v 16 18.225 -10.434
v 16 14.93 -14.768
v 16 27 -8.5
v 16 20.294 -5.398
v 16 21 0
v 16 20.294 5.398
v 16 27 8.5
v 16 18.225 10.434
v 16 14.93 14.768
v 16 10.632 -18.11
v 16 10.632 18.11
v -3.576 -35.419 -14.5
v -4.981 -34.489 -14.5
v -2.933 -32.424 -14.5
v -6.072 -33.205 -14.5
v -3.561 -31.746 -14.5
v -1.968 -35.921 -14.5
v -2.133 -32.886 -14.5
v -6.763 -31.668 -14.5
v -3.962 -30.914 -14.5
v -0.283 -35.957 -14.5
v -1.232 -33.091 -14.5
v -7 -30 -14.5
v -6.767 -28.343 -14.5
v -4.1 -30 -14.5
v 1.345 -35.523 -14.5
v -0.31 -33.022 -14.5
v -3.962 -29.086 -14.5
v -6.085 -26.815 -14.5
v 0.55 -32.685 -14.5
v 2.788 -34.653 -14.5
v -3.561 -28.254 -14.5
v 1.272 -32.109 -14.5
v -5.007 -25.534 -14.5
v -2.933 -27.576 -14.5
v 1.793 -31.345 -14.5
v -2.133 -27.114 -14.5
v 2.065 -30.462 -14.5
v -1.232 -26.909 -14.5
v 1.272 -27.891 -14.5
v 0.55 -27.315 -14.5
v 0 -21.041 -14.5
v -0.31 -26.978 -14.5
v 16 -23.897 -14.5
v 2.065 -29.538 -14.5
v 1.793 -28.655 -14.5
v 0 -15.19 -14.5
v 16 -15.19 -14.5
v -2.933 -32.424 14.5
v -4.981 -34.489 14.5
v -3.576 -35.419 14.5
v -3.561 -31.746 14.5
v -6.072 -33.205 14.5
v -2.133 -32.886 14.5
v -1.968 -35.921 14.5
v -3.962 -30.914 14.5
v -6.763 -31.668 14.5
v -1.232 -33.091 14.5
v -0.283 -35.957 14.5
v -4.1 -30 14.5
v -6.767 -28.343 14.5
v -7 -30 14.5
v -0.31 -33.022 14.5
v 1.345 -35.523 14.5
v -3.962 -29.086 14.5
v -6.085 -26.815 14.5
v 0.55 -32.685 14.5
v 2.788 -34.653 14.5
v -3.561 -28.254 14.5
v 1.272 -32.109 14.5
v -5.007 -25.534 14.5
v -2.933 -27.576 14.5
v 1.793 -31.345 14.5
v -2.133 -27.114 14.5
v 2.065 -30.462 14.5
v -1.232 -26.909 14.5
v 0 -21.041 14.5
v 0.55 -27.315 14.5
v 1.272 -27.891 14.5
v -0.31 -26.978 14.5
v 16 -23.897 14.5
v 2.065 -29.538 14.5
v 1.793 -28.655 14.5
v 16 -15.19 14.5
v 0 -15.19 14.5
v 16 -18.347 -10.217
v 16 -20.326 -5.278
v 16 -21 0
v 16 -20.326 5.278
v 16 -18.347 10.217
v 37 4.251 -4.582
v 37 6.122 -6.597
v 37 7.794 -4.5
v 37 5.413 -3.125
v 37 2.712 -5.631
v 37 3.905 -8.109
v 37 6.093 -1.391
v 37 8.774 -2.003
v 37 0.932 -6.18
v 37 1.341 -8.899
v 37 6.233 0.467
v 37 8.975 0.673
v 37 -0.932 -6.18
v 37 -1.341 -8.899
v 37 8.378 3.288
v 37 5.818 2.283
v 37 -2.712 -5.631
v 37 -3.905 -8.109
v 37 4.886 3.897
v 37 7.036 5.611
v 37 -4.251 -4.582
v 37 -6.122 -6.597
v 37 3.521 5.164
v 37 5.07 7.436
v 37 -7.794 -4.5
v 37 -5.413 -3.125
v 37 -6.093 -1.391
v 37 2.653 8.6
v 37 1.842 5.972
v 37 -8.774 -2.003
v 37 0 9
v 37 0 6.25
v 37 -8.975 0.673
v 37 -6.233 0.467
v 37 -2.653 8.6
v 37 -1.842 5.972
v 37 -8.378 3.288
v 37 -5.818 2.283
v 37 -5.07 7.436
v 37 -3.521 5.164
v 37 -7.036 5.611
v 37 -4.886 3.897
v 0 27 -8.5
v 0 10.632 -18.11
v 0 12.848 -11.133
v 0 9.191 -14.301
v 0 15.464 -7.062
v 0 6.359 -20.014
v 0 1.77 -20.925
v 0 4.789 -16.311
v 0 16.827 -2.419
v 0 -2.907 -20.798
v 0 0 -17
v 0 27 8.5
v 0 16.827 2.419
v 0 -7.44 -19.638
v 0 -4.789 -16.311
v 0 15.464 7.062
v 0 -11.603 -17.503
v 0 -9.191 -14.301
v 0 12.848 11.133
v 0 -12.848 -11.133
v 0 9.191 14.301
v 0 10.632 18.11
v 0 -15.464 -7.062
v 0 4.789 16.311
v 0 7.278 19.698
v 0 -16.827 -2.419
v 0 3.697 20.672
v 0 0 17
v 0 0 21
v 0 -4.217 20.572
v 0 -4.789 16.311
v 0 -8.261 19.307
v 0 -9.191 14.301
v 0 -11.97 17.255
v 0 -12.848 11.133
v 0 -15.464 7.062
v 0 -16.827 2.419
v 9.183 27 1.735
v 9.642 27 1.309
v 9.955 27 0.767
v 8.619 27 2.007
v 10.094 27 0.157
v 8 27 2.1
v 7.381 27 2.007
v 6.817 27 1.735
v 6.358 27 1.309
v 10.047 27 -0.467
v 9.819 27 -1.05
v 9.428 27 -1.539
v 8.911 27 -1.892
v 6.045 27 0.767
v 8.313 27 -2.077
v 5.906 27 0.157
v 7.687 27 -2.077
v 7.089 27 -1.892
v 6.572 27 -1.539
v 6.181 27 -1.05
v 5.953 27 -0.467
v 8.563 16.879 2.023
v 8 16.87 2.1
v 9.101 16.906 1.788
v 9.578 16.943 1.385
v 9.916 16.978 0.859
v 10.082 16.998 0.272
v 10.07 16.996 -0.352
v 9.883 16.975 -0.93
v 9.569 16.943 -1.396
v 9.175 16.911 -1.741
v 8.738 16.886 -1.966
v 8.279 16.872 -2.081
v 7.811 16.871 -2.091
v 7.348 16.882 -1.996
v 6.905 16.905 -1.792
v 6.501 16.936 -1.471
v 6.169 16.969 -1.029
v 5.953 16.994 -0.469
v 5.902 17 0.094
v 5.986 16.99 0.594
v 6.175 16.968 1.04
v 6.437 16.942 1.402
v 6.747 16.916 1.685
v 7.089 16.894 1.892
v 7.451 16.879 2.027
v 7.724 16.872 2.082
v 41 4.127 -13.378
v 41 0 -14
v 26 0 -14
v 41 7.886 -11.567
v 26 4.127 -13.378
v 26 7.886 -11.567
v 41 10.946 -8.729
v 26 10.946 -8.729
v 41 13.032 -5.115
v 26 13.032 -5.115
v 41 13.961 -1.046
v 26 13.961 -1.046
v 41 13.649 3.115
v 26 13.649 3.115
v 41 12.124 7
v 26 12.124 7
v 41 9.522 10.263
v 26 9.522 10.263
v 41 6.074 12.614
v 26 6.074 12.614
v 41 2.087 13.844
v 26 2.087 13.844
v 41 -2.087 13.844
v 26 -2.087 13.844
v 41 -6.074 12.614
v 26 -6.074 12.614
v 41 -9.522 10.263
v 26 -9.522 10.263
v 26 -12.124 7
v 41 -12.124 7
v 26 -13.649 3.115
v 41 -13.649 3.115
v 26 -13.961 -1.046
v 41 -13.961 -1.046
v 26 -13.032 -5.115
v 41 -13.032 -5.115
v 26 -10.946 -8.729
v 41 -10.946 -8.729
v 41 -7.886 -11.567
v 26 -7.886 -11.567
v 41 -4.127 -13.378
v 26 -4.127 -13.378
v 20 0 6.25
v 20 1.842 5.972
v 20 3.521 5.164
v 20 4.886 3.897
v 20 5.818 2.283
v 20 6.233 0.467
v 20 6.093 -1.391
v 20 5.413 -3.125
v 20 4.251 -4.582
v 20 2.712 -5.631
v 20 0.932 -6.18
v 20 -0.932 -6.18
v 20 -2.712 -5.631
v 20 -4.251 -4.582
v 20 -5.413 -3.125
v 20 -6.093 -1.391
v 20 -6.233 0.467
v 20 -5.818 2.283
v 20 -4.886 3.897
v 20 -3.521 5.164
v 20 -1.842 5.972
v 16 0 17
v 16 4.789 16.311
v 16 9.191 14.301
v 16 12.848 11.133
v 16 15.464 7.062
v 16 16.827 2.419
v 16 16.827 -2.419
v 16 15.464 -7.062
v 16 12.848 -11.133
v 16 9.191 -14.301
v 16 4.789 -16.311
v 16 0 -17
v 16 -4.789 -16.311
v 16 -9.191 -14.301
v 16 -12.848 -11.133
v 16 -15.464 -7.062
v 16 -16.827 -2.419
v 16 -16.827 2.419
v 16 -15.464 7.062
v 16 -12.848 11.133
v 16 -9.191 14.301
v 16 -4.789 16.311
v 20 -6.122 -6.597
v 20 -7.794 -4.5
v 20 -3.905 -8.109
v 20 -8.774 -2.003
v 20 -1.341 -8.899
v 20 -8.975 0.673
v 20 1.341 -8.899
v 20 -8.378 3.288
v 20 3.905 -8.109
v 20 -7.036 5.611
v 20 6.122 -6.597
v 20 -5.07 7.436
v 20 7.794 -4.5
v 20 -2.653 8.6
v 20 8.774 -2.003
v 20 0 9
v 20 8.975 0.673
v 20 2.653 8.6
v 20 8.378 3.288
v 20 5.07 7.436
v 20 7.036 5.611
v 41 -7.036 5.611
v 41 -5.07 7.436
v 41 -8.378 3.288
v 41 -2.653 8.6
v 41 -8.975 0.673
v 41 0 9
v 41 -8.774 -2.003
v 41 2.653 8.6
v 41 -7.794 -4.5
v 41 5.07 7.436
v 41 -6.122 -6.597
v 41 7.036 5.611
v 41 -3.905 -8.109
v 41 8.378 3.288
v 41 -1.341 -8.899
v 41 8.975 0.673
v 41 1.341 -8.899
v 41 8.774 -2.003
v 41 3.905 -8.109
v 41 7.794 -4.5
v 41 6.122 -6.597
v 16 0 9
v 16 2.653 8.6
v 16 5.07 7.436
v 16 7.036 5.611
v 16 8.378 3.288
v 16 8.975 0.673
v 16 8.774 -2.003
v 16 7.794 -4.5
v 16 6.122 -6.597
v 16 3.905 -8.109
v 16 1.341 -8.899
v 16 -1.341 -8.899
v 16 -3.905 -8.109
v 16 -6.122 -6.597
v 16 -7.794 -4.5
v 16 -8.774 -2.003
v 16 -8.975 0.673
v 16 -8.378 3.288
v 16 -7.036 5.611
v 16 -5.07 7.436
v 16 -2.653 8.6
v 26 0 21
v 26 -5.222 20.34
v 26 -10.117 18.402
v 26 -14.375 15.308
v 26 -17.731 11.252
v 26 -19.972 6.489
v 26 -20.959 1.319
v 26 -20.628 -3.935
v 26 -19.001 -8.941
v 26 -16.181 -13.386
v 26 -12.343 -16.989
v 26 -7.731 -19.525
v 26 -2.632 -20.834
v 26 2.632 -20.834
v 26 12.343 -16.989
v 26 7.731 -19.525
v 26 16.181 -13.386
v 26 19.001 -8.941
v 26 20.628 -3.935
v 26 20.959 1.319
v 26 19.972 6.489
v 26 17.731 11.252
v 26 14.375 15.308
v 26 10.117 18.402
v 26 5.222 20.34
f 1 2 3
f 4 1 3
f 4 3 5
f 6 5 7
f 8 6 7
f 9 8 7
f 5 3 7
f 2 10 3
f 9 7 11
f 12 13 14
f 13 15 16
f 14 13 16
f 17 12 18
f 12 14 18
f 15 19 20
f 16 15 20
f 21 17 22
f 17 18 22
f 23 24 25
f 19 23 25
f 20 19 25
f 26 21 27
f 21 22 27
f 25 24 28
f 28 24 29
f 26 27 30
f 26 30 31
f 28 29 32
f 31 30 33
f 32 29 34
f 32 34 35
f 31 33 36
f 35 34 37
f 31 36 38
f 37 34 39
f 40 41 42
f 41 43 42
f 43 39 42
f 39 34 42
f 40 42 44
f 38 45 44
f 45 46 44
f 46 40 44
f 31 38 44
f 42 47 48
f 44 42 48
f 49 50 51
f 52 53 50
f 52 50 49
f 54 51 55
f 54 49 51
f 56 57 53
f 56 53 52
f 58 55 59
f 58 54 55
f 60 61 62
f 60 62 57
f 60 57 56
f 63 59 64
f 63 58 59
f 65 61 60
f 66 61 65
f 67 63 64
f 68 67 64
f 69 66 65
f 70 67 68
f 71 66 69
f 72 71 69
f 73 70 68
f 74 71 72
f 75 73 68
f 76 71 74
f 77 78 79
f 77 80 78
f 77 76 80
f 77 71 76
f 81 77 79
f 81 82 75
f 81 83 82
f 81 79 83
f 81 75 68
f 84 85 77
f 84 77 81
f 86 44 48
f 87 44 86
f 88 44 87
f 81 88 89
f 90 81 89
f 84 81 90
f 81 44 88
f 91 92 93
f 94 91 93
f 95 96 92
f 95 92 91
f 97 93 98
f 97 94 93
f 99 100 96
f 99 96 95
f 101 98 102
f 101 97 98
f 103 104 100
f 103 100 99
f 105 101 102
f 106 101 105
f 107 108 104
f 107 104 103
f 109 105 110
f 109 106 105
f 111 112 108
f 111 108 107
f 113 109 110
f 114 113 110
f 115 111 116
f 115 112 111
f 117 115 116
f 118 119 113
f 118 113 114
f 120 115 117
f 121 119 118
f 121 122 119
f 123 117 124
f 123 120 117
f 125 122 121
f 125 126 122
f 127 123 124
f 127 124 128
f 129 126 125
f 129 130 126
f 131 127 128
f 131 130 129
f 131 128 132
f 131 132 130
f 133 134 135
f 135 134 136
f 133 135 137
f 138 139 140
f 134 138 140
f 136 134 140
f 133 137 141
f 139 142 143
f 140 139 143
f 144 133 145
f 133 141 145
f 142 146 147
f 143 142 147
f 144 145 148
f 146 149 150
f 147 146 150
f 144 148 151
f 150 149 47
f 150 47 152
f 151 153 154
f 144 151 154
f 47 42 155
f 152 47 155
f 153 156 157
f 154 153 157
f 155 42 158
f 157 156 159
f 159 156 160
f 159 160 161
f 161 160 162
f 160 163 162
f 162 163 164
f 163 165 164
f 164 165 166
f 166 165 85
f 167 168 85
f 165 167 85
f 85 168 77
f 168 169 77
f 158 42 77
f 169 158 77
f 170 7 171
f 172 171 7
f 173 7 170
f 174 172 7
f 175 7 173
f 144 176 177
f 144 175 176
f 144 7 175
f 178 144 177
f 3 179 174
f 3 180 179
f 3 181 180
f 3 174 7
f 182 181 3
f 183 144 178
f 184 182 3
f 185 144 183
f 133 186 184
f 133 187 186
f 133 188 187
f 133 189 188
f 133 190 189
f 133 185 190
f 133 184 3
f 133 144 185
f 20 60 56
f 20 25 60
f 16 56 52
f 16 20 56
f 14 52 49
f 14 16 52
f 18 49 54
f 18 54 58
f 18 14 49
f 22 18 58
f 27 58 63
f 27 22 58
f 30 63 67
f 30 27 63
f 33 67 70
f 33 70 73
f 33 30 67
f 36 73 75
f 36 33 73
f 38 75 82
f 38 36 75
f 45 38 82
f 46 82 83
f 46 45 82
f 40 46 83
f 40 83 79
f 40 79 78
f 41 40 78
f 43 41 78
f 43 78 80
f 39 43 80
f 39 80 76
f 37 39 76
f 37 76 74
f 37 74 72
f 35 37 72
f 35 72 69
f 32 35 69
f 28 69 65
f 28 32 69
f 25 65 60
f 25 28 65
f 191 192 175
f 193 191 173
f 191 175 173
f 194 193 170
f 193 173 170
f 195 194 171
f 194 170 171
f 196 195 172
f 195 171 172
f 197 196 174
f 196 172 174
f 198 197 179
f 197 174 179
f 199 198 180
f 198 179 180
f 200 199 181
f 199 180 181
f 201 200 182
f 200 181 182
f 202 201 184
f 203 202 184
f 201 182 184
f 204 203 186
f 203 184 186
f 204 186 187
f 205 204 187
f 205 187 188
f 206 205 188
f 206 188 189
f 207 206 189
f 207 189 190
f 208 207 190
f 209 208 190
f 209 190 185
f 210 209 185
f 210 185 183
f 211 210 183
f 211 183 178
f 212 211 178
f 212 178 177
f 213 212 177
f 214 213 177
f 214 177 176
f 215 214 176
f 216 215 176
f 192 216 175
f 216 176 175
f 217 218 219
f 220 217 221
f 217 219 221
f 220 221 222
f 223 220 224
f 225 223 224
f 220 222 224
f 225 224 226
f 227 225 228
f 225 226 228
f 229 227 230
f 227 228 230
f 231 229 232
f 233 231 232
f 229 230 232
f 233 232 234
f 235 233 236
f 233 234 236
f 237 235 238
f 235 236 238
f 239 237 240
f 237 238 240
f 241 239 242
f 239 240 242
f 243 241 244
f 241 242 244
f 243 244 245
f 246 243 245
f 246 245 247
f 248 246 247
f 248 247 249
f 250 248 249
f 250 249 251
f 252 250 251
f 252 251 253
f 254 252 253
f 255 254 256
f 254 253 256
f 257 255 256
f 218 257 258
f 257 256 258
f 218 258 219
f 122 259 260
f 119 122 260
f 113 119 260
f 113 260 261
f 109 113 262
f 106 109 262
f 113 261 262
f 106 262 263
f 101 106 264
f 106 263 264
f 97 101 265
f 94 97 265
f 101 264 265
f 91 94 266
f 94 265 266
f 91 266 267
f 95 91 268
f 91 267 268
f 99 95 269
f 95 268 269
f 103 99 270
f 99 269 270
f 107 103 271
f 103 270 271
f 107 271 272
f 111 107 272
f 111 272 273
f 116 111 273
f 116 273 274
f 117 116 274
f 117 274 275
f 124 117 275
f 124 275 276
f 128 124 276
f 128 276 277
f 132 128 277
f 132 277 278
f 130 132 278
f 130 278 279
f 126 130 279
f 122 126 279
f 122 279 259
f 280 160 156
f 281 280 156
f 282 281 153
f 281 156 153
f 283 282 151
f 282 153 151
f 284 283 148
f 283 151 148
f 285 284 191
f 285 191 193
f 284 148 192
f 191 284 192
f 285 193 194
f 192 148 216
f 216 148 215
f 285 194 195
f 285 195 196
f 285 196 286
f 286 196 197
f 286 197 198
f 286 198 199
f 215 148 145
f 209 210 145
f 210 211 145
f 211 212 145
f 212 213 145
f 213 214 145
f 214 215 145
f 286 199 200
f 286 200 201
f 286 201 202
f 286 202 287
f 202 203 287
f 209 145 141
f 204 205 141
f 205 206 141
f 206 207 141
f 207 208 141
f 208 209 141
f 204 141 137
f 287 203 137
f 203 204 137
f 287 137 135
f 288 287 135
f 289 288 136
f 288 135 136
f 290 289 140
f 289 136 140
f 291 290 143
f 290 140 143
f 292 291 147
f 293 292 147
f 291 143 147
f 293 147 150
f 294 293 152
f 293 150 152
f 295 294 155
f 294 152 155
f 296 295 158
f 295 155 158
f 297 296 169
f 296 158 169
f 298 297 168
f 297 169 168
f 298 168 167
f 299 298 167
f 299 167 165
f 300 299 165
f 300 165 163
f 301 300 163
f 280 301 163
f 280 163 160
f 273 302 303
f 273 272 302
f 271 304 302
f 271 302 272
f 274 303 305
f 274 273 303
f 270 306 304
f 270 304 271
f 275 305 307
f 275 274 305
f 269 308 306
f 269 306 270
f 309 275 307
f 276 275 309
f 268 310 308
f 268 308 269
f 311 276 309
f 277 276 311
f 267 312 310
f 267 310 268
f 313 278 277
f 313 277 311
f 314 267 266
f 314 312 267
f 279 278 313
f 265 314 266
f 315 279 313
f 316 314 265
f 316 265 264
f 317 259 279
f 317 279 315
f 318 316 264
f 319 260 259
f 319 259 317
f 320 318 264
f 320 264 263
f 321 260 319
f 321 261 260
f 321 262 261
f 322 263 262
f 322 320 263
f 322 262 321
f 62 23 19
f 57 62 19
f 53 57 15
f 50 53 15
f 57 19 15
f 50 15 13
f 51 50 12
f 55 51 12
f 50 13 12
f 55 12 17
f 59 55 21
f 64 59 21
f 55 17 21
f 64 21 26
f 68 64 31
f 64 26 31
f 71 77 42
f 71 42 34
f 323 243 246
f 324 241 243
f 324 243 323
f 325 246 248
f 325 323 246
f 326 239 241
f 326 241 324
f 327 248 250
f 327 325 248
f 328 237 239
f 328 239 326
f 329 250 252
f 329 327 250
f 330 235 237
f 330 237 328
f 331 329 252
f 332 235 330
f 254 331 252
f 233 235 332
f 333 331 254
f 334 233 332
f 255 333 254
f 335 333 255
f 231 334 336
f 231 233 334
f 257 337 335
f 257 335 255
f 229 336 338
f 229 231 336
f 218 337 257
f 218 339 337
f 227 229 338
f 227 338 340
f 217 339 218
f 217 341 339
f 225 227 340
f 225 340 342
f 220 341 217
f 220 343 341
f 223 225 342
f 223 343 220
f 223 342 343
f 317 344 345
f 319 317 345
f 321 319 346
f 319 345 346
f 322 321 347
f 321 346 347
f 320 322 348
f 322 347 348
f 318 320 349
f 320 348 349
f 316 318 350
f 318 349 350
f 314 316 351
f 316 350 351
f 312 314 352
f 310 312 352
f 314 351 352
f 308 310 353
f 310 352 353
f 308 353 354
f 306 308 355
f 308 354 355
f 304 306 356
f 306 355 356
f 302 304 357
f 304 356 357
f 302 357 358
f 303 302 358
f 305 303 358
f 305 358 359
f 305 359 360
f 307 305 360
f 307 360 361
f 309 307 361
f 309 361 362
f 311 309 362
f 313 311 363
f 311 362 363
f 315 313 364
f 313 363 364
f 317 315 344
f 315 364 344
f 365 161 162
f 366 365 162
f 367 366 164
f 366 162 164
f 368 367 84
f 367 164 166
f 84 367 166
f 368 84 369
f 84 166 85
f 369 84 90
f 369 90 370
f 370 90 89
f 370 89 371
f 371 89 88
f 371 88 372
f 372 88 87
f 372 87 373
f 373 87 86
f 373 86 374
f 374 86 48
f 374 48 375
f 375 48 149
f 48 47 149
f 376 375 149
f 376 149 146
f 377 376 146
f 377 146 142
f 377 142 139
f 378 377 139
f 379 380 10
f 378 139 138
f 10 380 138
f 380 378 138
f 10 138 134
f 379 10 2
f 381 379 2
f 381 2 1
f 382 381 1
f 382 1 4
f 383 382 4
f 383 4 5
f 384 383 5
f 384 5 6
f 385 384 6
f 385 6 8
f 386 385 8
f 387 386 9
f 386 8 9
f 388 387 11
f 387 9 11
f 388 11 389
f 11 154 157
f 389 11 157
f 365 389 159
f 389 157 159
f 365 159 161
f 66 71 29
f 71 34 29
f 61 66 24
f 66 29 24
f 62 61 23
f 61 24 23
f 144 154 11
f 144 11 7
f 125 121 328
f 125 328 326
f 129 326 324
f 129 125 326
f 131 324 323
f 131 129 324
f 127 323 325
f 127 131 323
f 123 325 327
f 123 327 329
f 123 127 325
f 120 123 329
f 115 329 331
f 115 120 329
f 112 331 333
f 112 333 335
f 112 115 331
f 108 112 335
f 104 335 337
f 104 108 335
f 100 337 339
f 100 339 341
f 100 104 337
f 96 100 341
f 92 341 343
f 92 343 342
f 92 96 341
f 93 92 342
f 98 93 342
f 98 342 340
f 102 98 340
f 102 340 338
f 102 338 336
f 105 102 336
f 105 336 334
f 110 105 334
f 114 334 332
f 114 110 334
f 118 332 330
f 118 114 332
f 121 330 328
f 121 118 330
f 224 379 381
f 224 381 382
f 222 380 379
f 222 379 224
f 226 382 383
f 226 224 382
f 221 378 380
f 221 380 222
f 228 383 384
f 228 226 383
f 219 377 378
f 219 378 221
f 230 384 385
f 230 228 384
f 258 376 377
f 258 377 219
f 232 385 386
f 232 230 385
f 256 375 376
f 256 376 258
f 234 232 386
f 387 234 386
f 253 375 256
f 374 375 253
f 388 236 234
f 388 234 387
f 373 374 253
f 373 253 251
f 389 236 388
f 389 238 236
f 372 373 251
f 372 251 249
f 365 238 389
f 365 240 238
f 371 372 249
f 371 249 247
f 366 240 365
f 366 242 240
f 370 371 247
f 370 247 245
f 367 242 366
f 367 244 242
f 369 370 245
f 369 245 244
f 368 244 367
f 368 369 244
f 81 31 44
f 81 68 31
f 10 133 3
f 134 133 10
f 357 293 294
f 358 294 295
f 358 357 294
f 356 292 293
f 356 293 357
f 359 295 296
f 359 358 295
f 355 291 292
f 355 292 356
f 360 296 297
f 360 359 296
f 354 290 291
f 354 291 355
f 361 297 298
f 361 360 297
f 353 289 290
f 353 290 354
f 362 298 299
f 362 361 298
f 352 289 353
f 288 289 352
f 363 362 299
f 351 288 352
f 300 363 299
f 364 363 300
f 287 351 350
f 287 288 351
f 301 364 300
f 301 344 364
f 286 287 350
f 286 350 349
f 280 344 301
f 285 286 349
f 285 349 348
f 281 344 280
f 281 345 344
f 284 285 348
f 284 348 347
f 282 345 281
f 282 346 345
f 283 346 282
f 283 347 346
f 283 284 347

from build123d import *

# Parameters (mm, degrees)
SKETCH_1_R               = 21
EXTRUDE_1_DEPTH          = 26
SKETCH_2_R               = 14
EXTRUDE_2_DEPTH          = 15
EXTRUDE_3_DEPTH          = 16
SKETCH_5_R               = 3.1
EXTRUDE_4_DEPTH          = 14.5
SKETCH_6_R               = 17
CUT_EXTRUDE_2_DEPTH      = 16
SKETCH_7_R               = 9
CUT_EXTRUDE_3_DEPTH      = 4
SKETCH_8_R               = 6.25
CUT_EXTRUDE_4_DEPTH      = 50.658836072
CUT_EXTRUDE_START        = -4
SKETCH_9_R               = 9
CUT_EXTRUDE_5_DEPTH      = 4
CUT_EXTRUDE_6_REACH      = 80.045
CUT_EXTRUDE_6_END_RADIUS = 17
SKETCH_10_R              = 1.75
HOLE_WIZARD_M5_1_REACH   = 76.155
HOLE_WIZARD_M5_1_BORE_R  = 2.1


with BuildPart() as part:
    # 草图1 → 凸台-拉伸1 (new body)
    with BuildSketch(Plane(origin=(0, 0, 0), x_dir=(0, 0, -1), z_dir=(1, 0, 0))):
        with Locations(Location((0, 0, 0), (0, 0, 180))):
            Circle(SKETCH_1_R)
    extrude(amount=EXTRUDE_1_DEPTH)

    # 草图2 → 凸台-拉伸2 (add)
    with BuildSketch(Plane(origin=(26, 0, 0), x_dir=(0, 0, -1), z_dir=(1, 0, 0))):
        Circle(SKETCH_2_R)
    extrude(amount=EXTRUDE_2_DEPTH)

    # 草图4 → 凸台-拉伸3 (add)
    with BuildSketch(Plane.ZY):
        with BuildLine():
            Line((0, 27), (-8.5, 27))
            Line((-8.5, 27), (-18.109583017, 10.63216831))
            ThreePointArc((-18.109583017, 10.63216831), (-10.433706568, 18.224647246), (0, 21))
            Line((0, 21), (0, 27))
        make_face()
        with BuildLine():
            Line((8.5, 27), (0, 27))
            Line((0, 27), (0, 21))
            ThreePointArc((0, 21), (10.433706568, 18.224647246), (18.109583017, 10.63216831))
            Line((18.109583017, 10.63216831), (8.5, 27))
        make_face()
    extrude(amount=-EXTRUDE_3_DEPTH)

    # 草图5 → 凸台-拉伸4 (add, symmetric)
    with BuildSketch(Plane.XY):
        with BuildLine():
            Line((16, -14), (0, -14))
            Line((0, -14), (0, -21.041445119))
            Line((0, -21.041445119), (-5.007077172, -25.534204154))
            ThreePointArc((-5.007077172, -25.534204154), (-6.479163396, -27.554847963), (-7, -30))
            ThreePointArc((-7, -30), (-3.575969226, -35.418891265), (2.788127515, -34.652965713))
            Line((2.788127515, -34.652965713), (16, -23.896759721))
            Line((16, -23.896759721), (16, -14))
        make_face()
        with Locations(Location((-1, -30, 0), (0, 0, 180))):
            Circle(SKETCH_5_R, mode=Mode.SUBTRACT)
    extrude(amount=EXTRUDE_4_DEPTH, both=True)

    # 草图6 → 切除-拉伸2 (cut)
    with BuildSketch(Plane.ZY):
        Circle(SKETCH_6_R)
    extrude(amount=-CUT_EXTRUDE_2_DEPTH, mode=Mode.SUBTRACT)

    # 草图7 → 切除-拉伸3 (cut)
    with BuildSketch(Plane.ZY.offset(-16)):
        Circle(SKETCH_7_R)
    extrude(amount=-CUT_EXTRUDE_3_DEPTH, mode=Mode.SUBTRACT)

    # 草图8 → 切除-拉伸4 (cut, through all)
    with BuildSketch(Plane.ZY.offset(-20)):
        Circle(SKETCH_8_R)
    extrude(amount=-CUT_EXTRUDE_4_DEPTH, mode=Mode.SUBTRACT)

    # 草图9 → 切除-拉伸5 (cut)
    with BuildSketch(Plane(origin=(41, 0, 0), x_dir=(0, 0, -1), z_dir=(1, 0, 0)).offset(CUT_EXTRUDE_START)):
        with Locations(Location((0, 0, 0), (0, 0, 180))):
            Circle(SKETCH_9_R)
    extrude(amount=CUT_EXTRUDE_5_DEPTH, mode=Mode.SUBTRACT)

    # 切除-拉伸6: up to this cylinder (the profile starts outside it)
    cut_extrude_6_end = Plane(origin=(8, 0, 0), z_dir=(-1, 0, 0)) * Cylinder(CUT_EXTRUDE_6_END_RADIUS, 195.09, mode=Mode.PRIVATE)
    # 草图10 → 切除-拉伸6 (cut, up to the surface)
    with BuildSketch(Plane(origin=(0, 27, 0), x_dir=(1, 0, 0), z_dir=(0, 1, 0)), mode=Mode.PRIVATE) as cut_extrude_6_sk1:
        with Locations(Location((8, 0, 0), (0, 0, 270))):
            Circle(SKETCH_10_R)
    cut_extrude_6_tool1 = extrude(cut_extrude_6_sk1.sketch, amount=-CUT_EXTRUDE_6_REACH, mode=Mode.PRIVATE) - cut_extrude_6_end
    add(cut_extrude_6_tool1.solids().sort_by_distance((8, 27, 0))[0], mode=Mode.SUBTRACT)

    # M5 螺纹孔1 bore (on position points) → M5 螺纹孔1 (cut, up to next)
    with BuildSketch(Plane(origin=(8, 27, 0), x_dir=(0, 0, 1), z_dir=(0, 1, 0)), mode=Mode.PRIVATE) as hole_wizard_m5_1_sk1:
        Circle(HOLE_WIZARD_M5_1_BORE_R)
    hole_wizard_m5_1_tool1 = extrude(hole_wizard_m5_1_sk1.sketch, amount=-HOLE_WIZARD_M5_1_REACH, mode=Mode.PRIVATE) & part.part
    add(hole_wizard_m5_1_tool1.solids().sort_by_distance((8, 27, 0))[0], mode=Mode.SUBTRACT)


solid = part.part
